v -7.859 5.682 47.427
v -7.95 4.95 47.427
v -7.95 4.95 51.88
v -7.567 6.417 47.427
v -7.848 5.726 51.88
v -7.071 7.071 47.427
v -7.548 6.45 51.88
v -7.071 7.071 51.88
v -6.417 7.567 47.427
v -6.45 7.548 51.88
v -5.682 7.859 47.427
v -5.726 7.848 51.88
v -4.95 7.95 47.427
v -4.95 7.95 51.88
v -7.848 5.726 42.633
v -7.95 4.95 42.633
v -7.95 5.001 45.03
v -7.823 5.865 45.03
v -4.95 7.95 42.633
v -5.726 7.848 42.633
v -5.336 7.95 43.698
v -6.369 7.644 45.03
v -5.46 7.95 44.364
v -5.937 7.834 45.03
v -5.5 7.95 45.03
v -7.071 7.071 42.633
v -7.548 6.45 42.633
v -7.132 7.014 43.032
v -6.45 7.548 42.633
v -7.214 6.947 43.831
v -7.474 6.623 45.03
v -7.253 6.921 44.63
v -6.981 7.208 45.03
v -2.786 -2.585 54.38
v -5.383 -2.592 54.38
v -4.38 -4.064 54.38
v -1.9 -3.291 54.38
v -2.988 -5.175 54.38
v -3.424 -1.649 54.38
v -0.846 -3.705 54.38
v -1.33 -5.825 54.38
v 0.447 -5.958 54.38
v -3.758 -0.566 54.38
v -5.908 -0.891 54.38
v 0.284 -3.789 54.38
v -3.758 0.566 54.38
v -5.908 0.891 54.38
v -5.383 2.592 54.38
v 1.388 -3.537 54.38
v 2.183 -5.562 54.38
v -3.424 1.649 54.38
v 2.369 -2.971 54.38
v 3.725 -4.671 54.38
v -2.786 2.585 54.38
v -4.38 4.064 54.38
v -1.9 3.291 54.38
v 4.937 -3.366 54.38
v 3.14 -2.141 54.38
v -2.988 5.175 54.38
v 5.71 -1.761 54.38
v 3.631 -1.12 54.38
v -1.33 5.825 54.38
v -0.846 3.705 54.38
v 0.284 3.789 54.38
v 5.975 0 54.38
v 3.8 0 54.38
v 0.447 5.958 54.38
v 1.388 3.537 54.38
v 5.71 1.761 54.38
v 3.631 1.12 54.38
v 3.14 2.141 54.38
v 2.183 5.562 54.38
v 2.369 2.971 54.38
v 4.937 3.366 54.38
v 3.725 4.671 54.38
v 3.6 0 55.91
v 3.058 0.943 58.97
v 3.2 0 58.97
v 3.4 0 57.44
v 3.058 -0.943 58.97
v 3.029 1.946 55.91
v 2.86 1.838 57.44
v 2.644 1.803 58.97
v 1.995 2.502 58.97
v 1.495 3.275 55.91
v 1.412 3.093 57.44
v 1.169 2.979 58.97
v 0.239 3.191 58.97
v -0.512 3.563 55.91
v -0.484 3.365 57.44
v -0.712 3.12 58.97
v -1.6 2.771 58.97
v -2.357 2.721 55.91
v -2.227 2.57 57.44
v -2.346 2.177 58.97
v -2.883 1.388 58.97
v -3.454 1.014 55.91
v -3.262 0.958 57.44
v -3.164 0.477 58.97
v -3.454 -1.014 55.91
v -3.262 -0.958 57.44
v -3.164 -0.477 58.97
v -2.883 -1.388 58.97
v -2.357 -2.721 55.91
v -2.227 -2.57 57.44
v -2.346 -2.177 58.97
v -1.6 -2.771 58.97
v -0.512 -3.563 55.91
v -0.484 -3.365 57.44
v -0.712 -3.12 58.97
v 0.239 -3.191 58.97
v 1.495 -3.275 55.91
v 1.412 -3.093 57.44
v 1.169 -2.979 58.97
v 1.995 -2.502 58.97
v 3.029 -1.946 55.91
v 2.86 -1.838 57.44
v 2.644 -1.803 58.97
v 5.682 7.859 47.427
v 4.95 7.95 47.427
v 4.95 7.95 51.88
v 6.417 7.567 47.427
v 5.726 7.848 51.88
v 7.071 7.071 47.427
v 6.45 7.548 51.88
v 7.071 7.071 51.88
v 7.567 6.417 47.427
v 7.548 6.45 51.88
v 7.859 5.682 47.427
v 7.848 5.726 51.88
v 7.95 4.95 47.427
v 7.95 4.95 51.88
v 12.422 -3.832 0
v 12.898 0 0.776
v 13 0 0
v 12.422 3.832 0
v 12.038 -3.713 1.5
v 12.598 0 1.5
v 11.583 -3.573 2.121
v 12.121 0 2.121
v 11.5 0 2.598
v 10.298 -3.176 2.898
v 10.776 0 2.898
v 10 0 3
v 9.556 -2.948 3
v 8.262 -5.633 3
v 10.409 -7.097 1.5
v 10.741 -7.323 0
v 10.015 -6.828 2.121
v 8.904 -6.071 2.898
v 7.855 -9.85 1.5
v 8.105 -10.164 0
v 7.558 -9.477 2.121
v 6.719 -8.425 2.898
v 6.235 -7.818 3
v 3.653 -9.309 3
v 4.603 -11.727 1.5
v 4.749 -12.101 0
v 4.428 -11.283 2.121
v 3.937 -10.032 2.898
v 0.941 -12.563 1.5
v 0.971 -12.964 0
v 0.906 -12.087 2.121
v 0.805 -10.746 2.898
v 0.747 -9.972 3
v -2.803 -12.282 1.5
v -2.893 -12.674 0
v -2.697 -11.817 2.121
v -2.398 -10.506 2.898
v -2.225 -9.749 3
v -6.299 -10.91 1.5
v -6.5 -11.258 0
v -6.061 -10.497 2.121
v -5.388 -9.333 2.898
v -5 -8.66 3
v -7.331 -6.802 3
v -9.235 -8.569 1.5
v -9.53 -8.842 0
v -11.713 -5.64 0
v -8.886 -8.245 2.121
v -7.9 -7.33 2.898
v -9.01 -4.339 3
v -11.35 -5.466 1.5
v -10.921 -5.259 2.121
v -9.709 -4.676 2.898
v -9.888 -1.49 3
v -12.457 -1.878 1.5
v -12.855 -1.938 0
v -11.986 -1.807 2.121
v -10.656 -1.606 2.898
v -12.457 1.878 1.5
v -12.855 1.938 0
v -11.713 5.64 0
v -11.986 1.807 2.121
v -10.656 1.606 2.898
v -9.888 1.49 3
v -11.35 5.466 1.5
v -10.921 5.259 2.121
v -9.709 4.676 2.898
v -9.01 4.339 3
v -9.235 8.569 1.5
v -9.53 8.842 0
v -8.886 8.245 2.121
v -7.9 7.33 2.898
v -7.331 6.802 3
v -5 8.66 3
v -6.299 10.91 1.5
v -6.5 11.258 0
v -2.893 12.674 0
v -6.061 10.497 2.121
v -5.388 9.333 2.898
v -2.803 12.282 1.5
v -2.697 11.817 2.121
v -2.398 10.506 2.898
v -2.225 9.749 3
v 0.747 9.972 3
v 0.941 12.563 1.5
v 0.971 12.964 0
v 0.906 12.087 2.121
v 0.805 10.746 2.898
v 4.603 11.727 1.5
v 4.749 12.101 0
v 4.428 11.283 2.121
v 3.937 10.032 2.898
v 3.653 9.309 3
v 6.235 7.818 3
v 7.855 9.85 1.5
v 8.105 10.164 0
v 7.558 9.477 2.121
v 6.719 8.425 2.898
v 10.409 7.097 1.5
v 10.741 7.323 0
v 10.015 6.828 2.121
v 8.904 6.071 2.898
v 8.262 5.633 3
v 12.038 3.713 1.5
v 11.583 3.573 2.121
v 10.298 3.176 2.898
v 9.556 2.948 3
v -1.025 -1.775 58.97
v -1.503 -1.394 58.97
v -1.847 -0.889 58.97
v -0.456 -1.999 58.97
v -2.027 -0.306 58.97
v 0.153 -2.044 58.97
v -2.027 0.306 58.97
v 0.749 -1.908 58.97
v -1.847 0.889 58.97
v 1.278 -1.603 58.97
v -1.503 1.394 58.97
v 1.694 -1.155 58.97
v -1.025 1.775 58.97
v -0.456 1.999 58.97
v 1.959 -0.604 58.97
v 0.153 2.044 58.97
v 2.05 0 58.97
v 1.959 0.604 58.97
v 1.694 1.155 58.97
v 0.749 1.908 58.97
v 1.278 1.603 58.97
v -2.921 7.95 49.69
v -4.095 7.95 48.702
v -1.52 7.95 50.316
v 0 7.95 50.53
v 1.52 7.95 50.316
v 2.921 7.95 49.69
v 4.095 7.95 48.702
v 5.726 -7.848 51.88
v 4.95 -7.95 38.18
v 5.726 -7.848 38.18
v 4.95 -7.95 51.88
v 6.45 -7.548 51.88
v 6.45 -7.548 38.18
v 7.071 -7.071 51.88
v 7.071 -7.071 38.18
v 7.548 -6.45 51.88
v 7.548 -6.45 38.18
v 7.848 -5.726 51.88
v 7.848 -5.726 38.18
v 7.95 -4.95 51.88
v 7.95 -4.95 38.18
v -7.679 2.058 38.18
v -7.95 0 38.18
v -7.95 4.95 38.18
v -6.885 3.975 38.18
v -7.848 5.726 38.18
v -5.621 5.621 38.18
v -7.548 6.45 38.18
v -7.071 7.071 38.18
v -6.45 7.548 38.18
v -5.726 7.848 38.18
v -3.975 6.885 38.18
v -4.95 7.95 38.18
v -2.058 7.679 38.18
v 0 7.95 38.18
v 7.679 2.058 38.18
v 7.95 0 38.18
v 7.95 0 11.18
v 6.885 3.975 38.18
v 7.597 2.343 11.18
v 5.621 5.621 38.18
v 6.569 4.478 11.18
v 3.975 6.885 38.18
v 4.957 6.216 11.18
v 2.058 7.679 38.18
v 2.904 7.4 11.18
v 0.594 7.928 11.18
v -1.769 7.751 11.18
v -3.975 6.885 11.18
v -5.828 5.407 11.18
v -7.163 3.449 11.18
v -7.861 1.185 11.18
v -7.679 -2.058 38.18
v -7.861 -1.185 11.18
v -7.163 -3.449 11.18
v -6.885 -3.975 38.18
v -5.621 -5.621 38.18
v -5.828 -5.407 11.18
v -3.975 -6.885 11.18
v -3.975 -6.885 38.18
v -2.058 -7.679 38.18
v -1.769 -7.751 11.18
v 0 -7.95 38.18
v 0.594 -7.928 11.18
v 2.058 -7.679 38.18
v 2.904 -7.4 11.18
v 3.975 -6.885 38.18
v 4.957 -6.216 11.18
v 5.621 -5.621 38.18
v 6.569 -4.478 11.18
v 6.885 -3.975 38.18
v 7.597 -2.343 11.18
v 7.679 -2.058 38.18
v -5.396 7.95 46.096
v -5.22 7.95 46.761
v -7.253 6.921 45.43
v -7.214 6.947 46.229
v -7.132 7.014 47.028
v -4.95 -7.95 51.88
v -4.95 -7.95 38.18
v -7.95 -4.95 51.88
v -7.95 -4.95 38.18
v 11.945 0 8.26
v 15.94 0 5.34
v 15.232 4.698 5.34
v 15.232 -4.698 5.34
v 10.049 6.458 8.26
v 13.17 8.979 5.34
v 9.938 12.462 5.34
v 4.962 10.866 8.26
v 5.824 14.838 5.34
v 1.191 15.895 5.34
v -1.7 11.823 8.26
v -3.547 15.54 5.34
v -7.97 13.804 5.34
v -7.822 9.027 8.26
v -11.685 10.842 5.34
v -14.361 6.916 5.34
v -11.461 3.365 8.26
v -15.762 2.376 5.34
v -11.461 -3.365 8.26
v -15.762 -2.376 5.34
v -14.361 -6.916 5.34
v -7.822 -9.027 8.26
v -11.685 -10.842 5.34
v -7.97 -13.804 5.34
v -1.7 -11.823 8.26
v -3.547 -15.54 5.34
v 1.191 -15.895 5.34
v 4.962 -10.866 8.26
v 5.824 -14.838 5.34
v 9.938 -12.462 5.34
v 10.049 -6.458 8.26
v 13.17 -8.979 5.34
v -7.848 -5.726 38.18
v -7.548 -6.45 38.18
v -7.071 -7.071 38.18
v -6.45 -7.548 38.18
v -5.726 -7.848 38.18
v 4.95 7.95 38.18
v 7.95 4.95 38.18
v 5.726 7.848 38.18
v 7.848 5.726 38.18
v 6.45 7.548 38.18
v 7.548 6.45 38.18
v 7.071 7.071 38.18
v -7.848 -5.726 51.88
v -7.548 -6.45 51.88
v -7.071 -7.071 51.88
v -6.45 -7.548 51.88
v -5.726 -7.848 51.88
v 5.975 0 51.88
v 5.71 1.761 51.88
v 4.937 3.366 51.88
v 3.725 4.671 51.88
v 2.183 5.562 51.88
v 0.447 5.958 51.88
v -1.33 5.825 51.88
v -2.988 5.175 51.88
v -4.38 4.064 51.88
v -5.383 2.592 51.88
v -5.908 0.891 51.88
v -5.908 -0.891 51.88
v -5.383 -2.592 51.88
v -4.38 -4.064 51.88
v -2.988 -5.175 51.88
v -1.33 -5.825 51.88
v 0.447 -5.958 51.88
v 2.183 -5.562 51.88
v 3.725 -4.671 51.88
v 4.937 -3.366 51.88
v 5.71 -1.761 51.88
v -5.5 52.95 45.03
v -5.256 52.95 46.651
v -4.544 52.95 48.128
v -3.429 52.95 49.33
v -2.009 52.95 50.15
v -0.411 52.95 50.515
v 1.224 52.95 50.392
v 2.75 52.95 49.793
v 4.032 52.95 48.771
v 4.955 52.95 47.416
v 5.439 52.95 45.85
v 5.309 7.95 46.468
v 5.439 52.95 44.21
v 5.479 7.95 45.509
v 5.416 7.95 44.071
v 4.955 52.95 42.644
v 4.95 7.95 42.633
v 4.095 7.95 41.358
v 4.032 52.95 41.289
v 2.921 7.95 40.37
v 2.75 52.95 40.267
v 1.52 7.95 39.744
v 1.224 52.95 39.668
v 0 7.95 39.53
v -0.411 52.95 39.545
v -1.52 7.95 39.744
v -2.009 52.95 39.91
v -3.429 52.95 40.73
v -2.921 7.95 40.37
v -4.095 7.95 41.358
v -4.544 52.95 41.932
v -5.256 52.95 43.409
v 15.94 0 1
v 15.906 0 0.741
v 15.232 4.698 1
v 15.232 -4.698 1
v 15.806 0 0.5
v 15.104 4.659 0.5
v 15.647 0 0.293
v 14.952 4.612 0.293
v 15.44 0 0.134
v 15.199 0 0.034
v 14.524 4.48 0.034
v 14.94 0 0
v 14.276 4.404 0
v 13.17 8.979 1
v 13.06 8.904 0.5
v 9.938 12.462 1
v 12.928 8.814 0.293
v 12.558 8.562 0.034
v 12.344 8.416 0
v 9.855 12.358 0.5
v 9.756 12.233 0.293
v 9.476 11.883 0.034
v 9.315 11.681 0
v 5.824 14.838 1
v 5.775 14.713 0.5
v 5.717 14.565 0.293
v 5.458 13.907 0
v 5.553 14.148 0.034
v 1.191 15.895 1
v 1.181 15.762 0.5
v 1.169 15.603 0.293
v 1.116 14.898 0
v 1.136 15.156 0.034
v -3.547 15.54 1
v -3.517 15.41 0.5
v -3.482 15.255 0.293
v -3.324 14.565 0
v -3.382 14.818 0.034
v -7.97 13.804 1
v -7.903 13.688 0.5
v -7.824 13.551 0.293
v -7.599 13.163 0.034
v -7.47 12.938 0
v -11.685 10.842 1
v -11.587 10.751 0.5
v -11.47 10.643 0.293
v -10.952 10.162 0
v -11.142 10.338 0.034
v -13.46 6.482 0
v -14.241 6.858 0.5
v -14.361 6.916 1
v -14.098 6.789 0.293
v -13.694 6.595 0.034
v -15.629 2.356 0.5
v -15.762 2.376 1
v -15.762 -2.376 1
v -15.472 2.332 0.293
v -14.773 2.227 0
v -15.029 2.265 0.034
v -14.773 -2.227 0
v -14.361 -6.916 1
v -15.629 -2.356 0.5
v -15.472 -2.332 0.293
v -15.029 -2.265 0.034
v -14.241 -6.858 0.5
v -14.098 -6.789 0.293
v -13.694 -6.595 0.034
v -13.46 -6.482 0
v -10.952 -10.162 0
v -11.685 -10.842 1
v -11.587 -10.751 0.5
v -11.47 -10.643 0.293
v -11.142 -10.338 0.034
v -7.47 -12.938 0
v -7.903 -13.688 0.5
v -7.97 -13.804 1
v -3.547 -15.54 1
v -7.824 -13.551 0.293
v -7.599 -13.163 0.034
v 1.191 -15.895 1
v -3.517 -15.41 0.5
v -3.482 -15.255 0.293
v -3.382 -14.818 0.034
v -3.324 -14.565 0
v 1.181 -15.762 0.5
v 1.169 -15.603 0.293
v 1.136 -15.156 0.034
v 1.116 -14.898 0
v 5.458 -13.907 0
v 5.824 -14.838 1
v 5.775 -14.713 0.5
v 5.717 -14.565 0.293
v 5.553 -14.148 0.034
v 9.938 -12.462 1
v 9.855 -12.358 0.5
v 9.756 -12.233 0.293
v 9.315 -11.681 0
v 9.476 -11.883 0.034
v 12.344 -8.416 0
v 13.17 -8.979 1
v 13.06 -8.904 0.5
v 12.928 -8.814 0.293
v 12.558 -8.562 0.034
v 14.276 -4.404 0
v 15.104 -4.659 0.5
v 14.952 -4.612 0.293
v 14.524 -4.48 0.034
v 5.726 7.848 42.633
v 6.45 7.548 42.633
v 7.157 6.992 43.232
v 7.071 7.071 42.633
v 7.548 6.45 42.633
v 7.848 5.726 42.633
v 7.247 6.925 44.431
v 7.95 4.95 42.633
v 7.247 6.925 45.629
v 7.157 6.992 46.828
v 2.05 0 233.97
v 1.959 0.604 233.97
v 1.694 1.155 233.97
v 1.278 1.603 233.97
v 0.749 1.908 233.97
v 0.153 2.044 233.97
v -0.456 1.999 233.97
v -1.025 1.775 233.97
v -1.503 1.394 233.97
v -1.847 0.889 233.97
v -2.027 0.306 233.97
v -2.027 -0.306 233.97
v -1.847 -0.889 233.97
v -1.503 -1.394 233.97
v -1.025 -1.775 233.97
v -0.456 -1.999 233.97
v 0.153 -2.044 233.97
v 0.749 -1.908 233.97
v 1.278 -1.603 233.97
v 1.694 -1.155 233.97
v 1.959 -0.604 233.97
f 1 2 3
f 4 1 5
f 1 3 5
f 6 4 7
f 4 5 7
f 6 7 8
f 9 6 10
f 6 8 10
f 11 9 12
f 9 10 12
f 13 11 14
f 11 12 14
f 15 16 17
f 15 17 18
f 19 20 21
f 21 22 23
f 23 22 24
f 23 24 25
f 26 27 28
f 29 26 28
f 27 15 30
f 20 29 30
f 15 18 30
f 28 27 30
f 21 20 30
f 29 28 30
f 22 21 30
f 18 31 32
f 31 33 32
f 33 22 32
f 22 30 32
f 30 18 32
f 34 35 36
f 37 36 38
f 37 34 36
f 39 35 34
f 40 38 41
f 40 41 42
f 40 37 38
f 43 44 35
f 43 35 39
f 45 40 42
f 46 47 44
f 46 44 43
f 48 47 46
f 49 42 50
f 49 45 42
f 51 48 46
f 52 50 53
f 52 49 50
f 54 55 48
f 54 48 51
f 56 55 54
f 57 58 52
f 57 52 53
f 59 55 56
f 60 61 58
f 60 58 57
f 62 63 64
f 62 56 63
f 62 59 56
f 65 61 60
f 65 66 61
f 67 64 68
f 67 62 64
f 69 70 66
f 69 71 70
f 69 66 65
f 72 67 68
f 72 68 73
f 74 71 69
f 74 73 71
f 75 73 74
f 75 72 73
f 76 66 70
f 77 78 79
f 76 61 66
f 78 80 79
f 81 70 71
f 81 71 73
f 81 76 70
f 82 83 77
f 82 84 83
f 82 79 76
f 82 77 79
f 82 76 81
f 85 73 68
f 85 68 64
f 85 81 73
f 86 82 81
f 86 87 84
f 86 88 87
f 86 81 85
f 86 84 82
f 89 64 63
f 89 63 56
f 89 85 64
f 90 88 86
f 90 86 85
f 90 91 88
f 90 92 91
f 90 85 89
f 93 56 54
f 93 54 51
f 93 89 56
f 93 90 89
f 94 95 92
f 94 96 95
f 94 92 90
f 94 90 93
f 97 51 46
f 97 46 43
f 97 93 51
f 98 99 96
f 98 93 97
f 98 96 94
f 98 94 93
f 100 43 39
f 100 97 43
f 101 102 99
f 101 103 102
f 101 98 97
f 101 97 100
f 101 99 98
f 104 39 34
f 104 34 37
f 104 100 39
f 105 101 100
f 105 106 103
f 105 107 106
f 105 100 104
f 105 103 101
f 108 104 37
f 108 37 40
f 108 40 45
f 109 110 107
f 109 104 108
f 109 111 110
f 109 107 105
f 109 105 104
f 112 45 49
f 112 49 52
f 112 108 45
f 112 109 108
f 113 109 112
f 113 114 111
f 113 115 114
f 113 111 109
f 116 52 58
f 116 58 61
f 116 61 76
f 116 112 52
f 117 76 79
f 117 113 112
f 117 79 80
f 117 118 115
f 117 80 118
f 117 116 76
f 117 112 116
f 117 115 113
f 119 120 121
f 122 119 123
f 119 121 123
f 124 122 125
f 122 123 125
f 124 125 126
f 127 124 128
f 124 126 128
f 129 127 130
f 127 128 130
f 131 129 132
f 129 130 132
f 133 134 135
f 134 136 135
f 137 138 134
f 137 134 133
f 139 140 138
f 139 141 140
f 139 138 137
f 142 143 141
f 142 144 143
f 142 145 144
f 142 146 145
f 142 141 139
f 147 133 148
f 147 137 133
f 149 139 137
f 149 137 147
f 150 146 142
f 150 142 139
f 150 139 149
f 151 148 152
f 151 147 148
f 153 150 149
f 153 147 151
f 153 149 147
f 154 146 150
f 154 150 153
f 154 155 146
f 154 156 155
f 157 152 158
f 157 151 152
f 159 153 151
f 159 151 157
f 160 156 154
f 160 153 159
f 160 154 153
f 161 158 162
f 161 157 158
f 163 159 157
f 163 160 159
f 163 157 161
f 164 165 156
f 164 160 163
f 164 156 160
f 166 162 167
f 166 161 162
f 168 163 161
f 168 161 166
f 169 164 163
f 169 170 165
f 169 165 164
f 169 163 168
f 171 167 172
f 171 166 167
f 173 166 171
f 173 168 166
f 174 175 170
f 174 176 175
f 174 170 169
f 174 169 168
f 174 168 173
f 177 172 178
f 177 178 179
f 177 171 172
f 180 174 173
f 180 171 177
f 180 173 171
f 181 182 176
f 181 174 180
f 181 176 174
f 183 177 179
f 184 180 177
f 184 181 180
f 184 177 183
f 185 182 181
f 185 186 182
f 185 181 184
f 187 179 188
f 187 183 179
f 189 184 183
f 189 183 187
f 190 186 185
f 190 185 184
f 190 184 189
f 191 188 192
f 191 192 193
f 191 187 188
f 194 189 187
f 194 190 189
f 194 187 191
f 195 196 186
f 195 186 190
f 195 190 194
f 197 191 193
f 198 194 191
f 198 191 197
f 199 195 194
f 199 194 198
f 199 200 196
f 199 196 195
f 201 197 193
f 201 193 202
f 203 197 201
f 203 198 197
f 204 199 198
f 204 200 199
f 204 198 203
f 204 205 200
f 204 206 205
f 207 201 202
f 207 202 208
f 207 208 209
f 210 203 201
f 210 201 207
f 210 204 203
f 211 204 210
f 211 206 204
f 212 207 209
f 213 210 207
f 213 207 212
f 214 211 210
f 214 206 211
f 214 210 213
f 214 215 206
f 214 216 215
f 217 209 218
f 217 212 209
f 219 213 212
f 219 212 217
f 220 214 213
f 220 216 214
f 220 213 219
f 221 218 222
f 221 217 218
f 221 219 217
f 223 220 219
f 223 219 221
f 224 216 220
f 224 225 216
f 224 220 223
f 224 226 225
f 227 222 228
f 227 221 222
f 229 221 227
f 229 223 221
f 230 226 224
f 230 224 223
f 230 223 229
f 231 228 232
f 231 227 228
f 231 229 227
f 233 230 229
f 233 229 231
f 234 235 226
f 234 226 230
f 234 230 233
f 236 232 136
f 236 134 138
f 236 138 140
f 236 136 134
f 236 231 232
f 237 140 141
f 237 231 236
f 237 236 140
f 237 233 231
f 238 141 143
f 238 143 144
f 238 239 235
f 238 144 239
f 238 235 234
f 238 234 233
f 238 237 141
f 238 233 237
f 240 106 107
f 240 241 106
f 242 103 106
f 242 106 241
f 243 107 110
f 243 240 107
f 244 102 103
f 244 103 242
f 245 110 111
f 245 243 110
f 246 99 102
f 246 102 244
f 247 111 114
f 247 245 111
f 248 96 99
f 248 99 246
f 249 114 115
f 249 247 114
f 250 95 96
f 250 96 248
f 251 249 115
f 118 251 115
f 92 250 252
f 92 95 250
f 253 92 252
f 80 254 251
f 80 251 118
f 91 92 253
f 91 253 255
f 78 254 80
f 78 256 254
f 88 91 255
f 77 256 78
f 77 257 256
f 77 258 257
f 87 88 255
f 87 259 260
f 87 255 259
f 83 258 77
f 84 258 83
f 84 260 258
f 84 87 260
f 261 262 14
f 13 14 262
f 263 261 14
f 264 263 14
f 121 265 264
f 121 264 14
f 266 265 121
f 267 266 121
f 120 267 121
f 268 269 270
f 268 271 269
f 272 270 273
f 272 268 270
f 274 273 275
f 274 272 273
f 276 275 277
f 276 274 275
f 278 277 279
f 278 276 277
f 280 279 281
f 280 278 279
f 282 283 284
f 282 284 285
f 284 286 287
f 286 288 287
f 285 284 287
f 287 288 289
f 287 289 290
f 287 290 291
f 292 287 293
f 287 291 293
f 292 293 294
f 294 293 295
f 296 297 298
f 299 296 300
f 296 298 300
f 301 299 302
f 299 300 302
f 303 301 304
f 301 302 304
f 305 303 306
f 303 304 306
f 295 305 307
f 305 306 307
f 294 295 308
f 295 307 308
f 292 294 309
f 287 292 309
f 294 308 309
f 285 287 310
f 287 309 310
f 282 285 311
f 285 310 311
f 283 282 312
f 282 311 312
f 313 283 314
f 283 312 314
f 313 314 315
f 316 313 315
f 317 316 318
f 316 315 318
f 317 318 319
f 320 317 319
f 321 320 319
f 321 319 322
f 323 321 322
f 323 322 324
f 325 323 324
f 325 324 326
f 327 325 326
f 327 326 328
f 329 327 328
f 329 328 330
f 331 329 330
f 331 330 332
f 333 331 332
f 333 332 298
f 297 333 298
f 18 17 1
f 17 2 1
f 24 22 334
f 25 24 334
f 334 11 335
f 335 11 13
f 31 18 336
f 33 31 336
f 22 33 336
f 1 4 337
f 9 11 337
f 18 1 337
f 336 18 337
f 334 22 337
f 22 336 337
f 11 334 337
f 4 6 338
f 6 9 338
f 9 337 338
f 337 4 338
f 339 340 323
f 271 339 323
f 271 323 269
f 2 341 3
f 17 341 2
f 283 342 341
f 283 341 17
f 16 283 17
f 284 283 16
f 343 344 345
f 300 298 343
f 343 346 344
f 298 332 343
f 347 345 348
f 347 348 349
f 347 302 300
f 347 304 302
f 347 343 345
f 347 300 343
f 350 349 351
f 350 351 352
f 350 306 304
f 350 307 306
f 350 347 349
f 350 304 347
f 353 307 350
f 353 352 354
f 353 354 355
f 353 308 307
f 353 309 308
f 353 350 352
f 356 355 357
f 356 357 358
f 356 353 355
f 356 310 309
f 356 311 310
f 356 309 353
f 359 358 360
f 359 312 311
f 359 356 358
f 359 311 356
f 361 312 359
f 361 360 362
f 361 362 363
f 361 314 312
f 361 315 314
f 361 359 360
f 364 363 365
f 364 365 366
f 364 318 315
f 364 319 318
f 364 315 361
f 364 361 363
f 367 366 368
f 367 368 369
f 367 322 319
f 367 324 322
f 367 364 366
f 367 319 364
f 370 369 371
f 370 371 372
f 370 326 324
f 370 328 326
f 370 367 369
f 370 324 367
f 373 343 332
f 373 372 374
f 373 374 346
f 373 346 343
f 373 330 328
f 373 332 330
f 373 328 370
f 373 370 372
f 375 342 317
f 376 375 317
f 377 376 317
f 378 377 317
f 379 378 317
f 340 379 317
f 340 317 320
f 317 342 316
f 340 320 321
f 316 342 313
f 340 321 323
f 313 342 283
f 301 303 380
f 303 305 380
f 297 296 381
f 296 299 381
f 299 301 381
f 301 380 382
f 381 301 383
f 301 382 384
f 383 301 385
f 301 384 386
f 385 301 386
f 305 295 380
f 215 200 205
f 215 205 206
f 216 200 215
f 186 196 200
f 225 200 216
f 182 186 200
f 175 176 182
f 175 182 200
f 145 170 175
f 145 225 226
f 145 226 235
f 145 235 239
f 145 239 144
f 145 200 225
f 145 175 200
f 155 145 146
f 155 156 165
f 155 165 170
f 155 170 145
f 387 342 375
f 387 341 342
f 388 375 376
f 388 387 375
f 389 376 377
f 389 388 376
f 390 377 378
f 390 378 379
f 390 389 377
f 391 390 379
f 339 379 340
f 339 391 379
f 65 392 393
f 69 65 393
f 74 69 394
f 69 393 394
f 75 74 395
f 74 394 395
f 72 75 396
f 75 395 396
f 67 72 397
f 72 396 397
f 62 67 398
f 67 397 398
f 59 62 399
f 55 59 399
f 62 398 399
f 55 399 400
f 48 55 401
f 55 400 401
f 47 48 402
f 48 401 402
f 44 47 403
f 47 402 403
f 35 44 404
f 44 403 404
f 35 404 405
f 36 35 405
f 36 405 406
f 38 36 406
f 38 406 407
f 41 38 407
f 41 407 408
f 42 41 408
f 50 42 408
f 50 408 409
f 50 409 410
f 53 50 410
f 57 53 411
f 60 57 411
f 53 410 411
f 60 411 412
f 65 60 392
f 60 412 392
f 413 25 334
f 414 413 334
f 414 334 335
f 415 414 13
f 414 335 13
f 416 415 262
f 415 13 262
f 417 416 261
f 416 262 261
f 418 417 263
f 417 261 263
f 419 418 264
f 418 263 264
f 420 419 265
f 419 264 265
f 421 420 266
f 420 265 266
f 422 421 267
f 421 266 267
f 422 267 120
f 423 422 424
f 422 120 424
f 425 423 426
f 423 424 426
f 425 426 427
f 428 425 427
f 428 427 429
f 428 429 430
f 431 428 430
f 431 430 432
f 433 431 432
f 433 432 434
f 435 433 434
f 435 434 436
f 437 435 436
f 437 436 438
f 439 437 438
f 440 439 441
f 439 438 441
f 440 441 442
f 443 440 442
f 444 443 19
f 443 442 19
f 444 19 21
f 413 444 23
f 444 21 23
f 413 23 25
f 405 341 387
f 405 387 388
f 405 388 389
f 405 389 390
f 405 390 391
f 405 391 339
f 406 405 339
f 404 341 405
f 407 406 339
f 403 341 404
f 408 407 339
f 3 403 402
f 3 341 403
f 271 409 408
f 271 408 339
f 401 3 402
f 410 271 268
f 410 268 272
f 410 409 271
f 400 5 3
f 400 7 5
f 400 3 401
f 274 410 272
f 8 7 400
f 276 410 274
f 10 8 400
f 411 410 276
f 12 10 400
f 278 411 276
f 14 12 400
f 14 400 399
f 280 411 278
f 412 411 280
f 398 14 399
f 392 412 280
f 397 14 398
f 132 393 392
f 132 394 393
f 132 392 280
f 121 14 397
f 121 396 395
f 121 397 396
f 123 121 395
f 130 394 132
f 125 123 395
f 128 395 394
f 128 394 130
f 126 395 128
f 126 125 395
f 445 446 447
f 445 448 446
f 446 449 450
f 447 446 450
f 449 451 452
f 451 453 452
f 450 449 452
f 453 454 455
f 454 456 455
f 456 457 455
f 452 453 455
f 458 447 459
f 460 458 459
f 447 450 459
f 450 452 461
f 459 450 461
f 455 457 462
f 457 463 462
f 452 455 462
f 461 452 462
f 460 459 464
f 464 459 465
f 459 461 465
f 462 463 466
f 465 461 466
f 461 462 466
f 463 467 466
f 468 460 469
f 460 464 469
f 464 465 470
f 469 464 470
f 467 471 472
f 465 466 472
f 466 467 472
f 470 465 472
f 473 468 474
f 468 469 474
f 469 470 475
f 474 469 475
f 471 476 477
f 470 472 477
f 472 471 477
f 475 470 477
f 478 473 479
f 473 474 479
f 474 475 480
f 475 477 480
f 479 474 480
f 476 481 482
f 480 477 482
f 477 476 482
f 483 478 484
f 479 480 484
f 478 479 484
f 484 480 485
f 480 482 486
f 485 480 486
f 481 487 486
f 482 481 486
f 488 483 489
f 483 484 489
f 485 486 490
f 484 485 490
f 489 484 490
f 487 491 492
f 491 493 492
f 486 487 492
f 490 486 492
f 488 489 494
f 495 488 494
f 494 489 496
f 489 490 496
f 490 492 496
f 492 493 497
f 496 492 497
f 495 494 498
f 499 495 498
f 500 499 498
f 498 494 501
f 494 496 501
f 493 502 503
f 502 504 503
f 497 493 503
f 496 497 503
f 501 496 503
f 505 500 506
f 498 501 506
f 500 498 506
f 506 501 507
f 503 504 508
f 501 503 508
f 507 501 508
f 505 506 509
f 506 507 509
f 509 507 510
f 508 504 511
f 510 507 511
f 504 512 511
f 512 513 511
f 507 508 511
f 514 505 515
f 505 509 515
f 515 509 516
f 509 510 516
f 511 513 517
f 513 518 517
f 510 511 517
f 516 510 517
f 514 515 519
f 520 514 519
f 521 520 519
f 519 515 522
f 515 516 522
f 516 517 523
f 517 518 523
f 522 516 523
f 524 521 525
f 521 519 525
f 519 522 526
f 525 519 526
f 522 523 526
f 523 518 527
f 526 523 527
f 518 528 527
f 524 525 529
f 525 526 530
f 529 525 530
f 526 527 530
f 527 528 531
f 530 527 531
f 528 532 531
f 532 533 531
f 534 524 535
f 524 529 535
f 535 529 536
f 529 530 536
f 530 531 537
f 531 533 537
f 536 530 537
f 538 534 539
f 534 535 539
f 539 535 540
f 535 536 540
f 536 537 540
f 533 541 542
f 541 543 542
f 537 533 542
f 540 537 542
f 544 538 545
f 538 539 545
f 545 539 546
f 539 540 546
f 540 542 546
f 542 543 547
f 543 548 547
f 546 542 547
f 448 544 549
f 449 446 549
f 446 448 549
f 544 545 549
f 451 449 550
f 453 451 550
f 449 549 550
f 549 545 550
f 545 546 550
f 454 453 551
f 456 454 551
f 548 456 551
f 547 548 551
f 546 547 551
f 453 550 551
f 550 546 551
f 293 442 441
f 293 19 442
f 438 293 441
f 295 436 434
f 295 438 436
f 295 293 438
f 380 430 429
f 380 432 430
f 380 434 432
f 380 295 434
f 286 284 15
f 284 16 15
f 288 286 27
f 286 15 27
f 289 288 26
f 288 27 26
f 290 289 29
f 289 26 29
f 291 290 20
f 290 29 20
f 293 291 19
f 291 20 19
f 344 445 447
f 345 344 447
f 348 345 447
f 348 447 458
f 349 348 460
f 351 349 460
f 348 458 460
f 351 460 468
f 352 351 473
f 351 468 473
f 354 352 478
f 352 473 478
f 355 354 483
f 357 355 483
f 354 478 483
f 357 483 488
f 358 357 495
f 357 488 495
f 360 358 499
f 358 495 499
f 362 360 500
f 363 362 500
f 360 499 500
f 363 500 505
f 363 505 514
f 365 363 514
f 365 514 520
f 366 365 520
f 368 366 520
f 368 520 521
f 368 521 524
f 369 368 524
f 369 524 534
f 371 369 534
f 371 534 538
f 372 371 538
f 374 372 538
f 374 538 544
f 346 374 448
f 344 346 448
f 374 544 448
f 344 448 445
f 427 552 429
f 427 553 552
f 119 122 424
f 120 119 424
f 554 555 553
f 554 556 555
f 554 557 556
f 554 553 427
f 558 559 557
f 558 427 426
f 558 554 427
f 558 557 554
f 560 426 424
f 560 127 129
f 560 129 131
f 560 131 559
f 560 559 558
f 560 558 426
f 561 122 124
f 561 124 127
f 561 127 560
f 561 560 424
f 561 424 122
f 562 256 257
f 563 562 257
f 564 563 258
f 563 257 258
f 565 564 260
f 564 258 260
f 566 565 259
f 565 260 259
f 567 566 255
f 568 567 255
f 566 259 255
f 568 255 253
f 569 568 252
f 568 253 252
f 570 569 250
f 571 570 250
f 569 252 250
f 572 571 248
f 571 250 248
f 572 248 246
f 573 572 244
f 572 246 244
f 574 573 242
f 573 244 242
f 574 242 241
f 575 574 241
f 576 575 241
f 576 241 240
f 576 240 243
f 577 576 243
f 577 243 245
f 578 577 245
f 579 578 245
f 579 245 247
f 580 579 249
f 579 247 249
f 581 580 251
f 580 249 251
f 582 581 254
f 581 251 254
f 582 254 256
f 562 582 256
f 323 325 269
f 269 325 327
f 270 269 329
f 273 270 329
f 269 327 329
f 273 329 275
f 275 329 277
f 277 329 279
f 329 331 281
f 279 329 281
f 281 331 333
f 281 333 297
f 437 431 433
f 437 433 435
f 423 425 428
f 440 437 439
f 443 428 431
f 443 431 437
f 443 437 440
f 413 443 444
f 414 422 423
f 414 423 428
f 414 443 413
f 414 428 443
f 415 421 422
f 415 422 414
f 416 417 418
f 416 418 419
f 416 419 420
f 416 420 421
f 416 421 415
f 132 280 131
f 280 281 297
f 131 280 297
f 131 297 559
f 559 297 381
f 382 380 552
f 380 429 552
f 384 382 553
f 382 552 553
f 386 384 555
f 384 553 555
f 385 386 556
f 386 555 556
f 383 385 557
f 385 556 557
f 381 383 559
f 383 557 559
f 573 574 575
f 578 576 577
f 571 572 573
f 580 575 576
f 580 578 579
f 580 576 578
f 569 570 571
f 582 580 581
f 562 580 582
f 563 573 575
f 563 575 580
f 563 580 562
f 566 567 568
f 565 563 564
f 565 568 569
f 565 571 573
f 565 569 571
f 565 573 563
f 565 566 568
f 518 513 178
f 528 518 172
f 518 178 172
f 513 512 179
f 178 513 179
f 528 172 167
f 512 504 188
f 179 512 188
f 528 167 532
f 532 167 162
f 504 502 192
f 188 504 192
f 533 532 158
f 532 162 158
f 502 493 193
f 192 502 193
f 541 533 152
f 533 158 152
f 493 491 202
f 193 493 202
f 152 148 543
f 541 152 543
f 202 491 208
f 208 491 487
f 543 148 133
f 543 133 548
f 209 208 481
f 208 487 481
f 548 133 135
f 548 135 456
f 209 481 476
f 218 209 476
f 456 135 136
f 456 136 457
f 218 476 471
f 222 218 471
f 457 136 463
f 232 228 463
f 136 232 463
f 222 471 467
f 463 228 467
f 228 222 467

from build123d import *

# Parameters (mm, degrees)
F0_R      = 15.94
F1_DEPTH  = 5.34
F1_FACE_R = 15.94
F3_R      = 7.95
F5_DEPTH  = 27
F7_W      = 15.9
F7_H      = 15.9
F8_DEPTH  = 13.7
F10_R     = 5.5
F11_DEPTH = 45
F13_R     = 5.975
F14_DEPTH = 2.5
F16_R     = 3.8
F18_R     = 3.2
F21_R     = 2.05
F22_DEPTH = 175
F23_R     = 3
F24_R     = 1
F26_R     = 13
F27_DEPTH = 3
F28_R     = 2.99999


# Not quite as in the source:
# - a fillet or chamfer is up to 0.001 mm smaller than in the source, because OpenCascade refuses the exact size


with BuildPart() as f1:
    # F0 (on Top) → F1 (new body)
    with BuildSketch(Plane.XY):
        Circle(F0_R)
    extrude(amount=F1_DEPTH)

    # F1_face (on face) → F4 section 0
    with BuildSketch(Plane.XY.offset(5.34)):
        Circle(F1_FACE_R)
    # F3 (on offset) → F4 section 1
    with BuildSketch(Plane.XY.offset(11.18)):
        Circle(F3_R)
    loft()

    # F5 (add): a face of the model
    f5_faces = [f1.faces().sort_by_distance(p)[0] for p in [
        (0, 0, 11.18),
    ]]
    extrude(f5_faces, amount=F5_DEPTH)

    # F7 (on offset) → F8 (join)
    with BuildSketch(Plane.XY.offset(38.18)):
        Rectangle(F7_W, F7_H)
    extrude(amount=F8_DEPTH)

    # F10 (on offset) → F11 (join)
    with BuildSketch(Plane(origin=(0, 7.95, 0), x_dir=(-1, 0, 0), z_dir=(0, 1, 0))):
        with Locations((0, 45.03)):
            Circle(F10_R)
    extrude(amount=F11_DEPTH)

    # F13 (on offset) → F14 (join)
    with BuildSketch(Plane.XY.offset(51.88)):
        Circle(F13_R)
    extrude(amount=F14_DEPTH)

    # F16 (on offset) → F19 section 0
    with BuildSketch(Plane.XY.offset(54.38)):
        Circle(F16_R)
    # F18 (on offset) → F19 section 1
    with BuildSketch(Plane.XY.offset(58.97)):
        Circle(F18_R)
    loft()

    # F21 (on offset) → F22 (join)
    with BuildSketch(Plane.XY.offset(58.97)):
        Circle(F21_R)
    extrude(amount=F22_DEPTH)

    # F23
    f23_edges = [f1.edges().sort_by_distance(p)[0] for p in [
        (-7.95, -7.95, 45.03),
        (-7.95, 7.95, 45.03),
        (7.95, -7.95, 45.03),
        (7.95, 7.95, 45.03),
    ]]
    fillet(f23_edges, radius=F23_R)

    # F24
    f24_edges = [f1.edges().sort_by_distance(p)[0] for p in [
        (-15.94, 0, 0),
    ]]
    fillet(f24_edges, radius=F24_R)

    # F26 (on offset) → F27 (cut)
    with BuildSketch(Plane(origin=(0, 0, 0), x_dir=(1, 0, 0), z_dir=(0, 0, -1))):
        Circle(F26_R)
    extrude(amount=-F27_DEPTH, mode=Mode.SUBTRACT)

    # F28 (radius 3 in the source; OpenCascade refuses exactly that, so slightly less here)
    f28_edges = [f1.edges().sort_by_distance(p)[0] for p in [
        (-13, 0, 3),
    ]]
    fillet(f28_edges, radius=F28_R)


with BuildPart() as f29_1:
    # F29: copy of F1
    add(f1.part)


solid = f1.part
